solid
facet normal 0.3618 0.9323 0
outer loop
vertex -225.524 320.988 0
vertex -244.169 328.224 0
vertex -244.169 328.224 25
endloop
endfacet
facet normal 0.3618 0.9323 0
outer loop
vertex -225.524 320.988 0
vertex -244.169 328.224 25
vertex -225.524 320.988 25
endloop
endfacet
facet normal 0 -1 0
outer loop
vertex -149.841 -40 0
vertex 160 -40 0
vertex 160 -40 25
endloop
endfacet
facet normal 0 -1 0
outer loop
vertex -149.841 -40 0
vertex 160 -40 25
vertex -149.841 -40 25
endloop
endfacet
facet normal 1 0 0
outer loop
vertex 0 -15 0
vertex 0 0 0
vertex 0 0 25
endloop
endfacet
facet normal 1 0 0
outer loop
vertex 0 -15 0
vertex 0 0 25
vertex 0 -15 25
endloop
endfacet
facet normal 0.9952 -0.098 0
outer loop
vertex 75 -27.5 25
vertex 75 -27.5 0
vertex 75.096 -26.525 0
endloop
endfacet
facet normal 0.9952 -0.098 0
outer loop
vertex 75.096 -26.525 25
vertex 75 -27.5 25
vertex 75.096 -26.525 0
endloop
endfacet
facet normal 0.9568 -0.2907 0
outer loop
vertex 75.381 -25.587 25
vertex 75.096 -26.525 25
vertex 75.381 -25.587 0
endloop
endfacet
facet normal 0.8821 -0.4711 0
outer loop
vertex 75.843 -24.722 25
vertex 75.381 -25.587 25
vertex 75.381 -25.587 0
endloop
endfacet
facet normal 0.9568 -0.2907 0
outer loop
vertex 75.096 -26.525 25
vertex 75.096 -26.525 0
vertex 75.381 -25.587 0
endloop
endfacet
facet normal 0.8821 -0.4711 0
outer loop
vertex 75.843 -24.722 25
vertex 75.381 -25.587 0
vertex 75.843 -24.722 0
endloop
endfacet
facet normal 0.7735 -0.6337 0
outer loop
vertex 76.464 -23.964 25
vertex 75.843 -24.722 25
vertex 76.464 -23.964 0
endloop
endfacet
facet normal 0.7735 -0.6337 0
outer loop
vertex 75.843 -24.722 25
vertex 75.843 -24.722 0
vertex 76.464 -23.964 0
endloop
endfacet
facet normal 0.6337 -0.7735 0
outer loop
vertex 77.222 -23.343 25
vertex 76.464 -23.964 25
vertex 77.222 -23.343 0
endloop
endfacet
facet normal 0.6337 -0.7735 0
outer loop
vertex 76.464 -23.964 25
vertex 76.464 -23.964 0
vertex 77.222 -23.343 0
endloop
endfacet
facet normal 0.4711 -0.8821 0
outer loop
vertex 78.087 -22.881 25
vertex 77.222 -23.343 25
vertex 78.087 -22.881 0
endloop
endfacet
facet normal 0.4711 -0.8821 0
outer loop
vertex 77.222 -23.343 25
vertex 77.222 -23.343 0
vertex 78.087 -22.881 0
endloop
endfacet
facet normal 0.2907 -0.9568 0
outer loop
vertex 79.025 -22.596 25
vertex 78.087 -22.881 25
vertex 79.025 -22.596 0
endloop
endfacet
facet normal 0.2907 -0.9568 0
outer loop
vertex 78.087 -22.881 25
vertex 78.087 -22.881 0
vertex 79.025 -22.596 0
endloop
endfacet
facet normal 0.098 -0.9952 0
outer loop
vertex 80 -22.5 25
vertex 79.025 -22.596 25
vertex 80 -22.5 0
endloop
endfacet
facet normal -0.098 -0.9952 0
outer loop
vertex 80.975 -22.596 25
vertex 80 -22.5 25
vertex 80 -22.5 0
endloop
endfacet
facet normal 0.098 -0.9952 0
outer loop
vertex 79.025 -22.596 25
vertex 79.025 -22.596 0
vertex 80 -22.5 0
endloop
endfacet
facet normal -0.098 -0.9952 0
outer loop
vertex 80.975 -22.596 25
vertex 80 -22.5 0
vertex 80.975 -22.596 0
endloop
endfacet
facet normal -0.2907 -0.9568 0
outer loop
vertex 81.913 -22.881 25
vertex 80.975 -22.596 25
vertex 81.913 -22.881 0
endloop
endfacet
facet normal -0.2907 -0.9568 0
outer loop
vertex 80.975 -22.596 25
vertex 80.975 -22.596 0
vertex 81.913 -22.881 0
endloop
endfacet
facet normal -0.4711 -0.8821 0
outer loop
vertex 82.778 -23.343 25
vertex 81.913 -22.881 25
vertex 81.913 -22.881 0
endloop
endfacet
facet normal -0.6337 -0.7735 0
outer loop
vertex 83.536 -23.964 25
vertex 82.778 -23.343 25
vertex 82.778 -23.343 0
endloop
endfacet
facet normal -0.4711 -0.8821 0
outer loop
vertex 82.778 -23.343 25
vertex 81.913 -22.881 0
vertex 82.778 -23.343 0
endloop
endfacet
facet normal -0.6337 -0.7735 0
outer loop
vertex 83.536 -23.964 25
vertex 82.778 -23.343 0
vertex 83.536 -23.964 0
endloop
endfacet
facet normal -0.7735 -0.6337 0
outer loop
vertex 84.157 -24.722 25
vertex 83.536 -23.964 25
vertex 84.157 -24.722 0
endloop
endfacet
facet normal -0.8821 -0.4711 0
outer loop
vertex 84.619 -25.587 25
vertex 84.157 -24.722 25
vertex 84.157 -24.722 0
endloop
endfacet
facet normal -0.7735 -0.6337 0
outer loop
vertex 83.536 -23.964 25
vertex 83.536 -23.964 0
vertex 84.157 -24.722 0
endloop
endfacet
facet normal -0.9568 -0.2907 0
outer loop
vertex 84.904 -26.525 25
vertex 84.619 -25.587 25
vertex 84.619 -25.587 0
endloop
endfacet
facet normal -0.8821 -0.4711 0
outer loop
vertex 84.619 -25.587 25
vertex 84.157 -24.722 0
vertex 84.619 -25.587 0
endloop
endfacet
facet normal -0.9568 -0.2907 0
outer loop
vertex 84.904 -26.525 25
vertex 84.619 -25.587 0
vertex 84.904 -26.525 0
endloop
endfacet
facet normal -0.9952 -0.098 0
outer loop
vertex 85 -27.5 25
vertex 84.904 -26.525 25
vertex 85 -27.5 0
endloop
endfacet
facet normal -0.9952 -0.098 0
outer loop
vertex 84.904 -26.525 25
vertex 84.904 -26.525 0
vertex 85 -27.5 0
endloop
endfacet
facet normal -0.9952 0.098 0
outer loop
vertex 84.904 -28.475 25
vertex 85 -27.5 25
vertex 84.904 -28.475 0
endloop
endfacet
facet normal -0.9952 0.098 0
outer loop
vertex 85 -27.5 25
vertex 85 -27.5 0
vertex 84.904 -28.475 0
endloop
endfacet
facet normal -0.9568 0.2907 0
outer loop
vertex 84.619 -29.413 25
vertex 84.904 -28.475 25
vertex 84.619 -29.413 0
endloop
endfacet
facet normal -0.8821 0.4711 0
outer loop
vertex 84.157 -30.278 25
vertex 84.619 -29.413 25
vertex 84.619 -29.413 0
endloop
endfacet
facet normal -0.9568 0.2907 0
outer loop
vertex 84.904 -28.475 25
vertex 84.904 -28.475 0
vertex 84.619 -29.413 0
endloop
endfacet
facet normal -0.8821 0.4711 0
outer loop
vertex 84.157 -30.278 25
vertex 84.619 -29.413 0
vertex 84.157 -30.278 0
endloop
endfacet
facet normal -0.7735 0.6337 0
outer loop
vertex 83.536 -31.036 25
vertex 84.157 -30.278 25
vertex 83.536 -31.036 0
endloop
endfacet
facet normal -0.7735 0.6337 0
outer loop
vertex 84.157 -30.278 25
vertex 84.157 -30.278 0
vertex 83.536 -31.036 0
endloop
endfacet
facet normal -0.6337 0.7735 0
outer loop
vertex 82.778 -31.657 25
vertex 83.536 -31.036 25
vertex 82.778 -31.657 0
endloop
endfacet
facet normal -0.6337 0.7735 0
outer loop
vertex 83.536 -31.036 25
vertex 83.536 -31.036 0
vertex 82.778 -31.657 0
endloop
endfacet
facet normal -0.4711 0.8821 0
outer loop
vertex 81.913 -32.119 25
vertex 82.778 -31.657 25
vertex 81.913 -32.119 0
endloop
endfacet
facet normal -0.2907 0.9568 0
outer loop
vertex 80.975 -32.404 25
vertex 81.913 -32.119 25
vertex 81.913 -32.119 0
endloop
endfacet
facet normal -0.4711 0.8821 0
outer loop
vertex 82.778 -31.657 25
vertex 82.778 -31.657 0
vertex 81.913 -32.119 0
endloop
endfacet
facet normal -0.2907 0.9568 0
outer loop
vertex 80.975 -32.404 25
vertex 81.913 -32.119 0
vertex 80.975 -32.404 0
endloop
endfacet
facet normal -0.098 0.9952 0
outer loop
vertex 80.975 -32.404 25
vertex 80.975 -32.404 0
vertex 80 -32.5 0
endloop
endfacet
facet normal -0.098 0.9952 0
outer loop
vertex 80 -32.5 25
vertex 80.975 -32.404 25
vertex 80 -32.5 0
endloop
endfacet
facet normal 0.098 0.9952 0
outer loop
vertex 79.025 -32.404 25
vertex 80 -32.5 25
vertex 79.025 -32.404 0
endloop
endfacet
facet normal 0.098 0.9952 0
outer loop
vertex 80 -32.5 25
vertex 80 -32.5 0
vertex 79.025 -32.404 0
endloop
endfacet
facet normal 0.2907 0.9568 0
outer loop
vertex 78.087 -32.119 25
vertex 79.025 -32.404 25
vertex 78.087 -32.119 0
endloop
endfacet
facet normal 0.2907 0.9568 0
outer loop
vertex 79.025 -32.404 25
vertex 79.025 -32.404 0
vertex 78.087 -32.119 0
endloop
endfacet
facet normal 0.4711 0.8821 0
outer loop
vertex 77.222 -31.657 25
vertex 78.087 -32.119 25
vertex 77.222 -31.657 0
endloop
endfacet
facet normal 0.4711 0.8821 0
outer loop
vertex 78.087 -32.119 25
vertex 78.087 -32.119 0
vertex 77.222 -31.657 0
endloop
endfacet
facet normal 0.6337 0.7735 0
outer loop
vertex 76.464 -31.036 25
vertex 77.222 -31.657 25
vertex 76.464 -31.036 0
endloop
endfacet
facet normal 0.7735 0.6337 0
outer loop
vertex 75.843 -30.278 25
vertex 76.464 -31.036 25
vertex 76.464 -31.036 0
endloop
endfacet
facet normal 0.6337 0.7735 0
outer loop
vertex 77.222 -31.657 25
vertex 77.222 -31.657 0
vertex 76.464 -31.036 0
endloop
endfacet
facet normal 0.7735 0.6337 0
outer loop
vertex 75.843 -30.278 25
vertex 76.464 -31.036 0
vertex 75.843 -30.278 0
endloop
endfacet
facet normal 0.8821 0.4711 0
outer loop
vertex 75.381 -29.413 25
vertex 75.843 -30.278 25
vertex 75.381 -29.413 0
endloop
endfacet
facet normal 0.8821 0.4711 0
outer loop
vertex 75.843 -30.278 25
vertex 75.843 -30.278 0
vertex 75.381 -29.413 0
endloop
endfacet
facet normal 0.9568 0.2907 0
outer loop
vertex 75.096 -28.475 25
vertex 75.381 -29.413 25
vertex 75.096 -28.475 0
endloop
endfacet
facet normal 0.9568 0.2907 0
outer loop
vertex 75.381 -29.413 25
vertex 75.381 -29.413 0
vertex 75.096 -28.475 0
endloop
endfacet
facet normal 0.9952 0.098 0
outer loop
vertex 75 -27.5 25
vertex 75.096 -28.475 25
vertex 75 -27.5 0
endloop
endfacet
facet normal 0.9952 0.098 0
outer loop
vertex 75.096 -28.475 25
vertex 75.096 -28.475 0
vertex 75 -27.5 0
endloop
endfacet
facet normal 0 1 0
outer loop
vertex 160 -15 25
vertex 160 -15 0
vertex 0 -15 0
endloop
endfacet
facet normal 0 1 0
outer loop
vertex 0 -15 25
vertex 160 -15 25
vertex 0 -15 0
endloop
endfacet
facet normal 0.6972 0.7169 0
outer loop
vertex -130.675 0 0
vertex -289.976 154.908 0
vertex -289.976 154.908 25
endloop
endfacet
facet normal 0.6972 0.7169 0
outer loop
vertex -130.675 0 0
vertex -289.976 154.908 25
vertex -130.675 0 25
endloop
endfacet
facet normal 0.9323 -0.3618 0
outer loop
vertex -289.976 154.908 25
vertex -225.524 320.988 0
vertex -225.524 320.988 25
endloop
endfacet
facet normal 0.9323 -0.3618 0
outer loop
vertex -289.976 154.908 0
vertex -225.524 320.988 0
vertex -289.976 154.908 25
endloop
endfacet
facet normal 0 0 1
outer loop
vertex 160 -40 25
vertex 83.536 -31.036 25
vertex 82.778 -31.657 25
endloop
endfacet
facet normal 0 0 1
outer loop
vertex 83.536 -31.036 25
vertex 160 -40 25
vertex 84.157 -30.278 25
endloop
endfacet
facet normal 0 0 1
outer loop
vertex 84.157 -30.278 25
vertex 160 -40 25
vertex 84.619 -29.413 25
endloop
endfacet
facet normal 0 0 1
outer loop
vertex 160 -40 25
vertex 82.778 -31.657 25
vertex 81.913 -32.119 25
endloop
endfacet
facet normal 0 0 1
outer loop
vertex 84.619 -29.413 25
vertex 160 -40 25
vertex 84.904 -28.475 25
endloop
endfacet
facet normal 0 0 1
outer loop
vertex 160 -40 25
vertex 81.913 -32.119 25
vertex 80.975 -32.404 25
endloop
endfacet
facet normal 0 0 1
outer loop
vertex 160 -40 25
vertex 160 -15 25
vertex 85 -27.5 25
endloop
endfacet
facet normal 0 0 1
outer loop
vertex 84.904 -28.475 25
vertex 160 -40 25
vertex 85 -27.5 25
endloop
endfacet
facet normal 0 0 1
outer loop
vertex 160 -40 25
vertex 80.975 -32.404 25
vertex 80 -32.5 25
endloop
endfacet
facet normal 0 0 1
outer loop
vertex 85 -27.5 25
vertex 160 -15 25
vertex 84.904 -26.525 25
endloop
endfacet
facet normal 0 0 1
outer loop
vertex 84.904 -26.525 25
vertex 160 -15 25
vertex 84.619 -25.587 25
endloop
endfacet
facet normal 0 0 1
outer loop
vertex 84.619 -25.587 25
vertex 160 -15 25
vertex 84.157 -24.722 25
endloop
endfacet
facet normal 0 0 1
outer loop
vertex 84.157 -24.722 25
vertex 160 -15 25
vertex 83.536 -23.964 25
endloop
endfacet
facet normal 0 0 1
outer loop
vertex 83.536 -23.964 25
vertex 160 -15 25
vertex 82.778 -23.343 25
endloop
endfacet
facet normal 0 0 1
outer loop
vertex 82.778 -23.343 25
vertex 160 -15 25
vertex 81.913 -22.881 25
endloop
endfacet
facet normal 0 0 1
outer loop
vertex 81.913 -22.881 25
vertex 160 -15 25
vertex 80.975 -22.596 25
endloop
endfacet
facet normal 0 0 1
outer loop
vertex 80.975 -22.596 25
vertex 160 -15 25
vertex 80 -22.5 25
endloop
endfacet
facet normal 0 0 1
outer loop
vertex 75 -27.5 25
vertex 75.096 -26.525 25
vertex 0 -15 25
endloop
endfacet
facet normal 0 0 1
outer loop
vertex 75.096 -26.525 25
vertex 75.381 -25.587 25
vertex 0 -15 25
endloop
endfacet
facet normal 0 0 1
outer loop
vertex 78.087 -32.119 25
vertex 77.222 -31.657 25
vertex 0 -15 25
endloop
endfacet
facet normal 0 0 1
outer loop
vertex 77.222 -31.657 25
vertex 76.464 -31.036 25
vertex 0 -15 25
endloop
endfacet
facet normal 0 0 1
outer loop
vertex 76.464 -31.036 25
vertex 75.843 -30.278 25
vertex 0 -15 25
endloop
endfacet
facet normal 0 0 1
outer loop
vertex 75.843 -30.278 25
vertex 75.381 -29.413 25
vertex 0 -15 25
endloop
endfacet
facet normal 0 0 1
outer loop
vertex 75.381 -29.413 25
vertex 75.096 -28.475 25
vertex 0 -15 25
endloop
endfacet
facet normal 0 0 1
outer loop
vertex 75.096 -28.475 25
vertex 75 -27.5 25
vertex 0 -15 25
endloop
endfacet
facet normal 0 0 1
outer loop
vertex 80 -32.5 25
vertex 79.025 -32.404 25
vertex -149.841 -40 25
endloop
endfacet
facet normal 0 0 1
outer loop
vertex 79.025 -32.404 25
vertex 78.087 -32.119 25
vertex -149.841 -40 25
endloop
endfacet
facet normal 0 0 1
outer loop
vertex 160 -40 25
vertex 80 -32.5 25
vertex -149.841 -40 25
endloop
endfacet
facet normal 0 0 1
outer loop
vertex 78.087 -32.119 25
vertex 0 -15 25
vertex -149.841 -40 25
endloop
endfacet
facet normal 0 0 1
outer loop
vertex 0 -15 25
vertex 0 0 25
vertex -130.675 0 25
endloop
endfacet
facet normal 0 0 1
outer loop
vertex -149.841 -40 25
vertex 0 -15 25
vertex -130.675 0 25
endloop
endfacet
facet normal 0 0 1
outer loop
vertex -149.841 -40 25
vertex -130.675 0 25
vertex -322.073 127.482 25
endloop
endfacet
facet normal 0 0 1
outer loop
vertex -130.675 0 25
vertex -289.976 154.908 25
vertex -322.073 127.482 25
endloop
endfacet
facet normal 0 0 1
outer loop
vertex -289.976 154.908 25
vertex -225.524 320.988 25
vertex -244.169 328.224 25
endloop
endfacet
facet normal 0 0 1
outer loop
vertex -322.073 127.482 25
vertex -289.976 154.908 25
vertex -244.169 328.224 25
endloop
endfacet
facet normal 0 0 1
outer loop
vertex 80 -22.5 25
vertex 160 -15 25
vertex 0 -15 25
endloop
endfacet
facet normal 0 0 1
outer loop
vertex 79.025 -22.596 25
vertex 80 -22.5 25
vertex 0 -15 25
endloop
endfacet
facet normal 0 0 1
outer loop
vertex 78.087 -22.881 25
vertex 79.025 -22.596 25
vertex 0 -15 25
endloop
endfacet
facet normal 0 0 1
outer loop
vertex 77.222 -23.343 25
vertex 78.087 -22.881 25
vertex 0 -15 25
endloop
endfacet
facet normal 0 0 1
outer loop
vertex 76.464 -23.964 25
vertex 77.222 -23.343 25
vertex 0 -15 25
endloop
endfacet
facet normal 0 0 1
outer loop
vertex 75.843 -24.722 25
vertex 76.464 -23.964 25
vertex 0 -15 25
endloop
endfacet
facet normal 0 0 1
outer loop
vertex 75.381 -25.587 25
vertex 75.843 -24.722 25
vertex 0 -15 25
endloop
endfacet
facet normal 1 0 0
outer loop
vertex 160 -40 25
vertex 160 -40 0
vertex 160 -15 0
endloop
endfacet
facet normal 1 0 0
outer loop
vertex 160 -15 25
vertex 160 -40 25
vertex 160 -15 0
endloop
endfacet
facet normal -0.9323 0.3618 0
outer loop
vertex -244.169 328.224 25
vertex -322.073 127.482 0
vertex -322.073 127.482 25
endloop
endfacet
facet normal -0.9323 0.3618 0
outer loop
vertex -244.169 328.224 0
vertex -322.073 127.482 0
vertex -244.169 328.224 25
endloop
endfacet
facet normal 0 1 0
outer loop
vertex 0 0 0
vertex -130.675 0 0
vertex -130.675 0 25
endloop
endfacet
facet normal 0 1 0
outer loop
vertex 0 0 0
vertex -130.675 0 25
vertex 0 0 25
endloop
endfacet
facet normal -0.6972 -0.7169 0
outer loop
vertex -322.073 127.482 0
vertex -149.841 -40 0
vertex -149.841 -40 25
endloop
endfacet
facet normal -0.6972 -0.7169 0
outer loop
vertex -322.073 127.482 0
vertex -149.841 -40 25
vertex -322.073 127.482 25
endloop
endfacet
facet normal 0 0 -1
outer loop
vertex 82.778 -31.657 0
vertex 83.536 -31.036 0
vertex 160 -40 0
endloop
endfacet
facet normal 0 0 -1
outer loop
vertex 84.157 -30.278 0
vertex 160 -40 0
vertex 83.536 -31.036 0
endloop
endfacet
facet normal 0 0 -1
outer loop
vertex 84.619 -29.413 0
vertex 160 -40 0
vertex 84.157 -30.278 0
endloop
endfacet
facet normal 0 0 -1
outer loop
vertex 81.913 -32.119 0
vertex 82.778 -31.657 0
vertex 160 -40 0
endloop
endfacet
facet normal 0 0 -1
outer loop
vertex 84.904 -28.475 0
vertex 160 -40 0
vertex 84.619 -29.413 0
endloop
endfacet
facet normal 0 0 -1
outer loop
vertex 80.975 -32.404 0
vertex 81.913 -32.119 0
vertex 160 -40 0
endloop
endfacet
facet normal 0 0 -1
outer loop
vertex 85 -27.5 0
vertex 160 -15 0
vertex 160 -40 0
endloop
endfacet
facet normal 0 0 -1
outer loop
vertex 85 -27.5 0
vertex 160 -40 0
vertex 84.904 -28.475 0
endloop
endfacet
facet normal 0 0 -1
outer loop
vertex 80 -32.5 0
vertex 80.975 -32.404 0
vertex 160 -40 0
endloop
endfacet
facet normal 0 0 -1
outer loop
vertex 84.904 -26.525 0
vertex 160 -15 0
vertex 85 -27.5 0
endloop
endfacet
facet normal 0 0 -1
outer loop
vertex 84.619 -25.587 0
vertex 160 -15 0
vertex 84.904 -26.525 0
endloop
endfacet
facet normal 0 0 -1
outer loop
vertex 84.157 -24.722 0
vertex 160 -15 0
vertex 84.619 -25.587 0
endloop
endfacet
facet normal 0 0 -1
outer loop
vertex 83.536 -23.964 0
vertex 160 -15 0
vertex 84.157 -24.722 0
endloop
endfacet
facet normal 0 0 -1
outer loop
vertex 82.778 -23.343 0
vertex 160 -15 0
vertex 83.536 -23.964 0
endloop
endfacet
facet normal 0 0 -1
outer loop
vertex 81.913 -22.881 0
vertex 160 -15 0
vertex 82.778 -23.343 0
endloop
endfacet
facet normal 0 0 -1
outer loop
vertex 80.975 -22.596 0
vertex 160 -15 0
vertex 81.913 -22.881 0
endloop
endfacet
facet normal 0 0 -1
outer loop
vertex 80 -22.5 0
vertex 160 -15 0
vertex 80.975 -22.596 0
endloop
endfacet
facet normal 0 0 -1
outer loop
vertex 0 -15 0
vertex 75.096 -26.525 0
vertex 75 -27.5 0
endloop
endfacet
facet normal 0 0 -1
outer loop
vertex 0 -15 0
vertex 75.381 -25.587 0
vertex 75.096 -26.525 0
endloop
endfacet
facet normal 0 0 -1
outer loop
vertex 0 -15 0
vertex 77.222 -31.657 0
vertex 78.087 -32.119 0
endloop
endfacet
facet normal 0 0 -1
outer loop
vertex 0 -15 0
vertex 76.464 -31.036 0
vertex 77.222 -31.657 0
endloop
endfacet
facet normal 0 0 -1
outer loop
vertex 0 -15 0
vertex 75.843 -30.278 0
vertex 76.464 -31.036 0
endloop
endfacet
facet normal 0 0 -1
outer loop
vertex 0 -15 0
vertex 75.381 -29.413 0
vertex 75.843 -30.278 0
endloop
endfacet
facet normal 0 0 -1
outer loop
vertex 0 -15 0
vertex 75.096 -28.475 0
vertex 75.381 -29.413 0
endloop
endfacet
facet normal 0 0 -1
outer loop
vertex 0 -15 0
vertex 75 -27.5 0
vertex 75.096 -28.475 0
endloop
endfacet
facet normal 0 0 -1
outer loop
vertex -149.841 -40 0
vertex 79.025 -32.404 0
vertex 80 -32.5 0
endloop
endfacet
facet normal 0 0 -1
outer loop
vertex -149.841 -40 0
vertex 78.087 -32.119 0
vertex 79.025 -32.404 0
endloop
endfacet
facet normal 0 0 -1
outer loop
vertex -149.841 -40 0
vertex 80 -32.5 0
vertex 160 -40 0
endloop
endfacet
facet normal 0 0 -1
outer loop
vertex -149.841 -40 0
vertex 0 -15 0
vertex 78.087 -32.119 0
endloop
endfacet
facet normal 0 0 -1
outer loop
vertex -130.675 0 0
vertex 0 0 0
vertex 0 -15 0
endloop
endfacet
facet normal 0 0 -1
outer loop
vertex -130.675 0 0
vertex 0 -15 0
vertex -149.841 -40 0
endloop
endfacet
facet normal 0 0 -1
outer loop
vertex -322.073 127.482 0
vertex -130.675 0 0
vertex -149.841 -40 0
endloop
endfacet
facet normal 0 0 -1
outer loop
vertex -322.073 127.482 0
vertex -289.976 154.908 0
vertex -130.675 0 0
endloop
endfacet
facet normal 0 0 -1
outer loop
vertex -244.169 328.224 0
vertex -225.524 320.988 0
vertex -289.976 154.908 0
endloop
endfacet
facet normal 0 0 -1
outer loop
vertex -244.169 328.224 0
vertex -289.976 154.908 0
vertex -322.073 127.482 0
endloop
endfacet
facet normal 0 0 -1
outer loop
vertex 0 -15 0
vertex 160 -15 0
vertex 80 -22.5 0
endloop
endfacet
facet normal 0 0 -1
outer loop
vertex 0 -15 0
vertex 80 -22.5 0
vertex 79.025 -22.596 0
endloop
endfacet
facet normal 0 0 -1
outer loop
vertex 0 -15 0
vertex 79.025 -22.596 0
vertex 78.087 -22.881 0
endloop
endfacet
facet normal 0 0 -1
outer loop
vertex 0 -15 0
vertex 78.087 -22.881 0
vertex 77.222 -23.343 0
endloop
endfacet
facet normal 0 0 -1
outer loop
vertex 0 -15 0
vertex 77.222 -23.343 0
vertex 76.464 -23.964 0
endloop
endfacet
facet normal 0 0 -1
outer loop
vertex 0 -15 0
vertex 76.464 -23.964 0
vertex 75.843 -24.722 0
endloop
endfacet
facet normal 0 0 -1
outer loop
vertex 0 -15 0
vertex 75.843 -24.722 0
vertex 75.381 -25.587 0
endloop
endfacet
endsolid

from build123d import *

# Parameters (mm, degrees)
EXTRUDE_2_DEPTH = 25
SKETCH_3_W      = 160
SKETCH_3_H      = 25
SKETCH_3_R      = 5
EXTRUDE_3_DEPTH = 25


with BuildPart() as part:
    # 草图1 → 凸台-拉伸2 (new body)
    with BuildSketch(Plane.XY):
        Polygon((0, 0), (0, -40), (-149.841058107, -40), (-322.072943576, 127.48172604), (-244.168859764, 328.224008492), (-225.523676843, 320.988184155), (-289.976254661, 154.907576464), (-130.675150004, 0), align=None)
    extrude(amount=EXTRUDE_2_DEPTH)

    # 草图3 → 凸台-拉伸3 (add)
    with BuildSketch(Plane(origin=(0, 0, 0), x_dir=(-1, 0, 0), z_dir=(0, 0, -1))):
        with Locations((-80, -27.5)):
            Rectangle(SKETCH_3_W, SKETCH_3_H)
        with Locations((-80, -27.5)):
            Circle(SKETCH_3_R, mode=Mode.SUBTRACT)
    extrude(amount=-EXTRUDE_3_DEPTH)


solid = part.part
